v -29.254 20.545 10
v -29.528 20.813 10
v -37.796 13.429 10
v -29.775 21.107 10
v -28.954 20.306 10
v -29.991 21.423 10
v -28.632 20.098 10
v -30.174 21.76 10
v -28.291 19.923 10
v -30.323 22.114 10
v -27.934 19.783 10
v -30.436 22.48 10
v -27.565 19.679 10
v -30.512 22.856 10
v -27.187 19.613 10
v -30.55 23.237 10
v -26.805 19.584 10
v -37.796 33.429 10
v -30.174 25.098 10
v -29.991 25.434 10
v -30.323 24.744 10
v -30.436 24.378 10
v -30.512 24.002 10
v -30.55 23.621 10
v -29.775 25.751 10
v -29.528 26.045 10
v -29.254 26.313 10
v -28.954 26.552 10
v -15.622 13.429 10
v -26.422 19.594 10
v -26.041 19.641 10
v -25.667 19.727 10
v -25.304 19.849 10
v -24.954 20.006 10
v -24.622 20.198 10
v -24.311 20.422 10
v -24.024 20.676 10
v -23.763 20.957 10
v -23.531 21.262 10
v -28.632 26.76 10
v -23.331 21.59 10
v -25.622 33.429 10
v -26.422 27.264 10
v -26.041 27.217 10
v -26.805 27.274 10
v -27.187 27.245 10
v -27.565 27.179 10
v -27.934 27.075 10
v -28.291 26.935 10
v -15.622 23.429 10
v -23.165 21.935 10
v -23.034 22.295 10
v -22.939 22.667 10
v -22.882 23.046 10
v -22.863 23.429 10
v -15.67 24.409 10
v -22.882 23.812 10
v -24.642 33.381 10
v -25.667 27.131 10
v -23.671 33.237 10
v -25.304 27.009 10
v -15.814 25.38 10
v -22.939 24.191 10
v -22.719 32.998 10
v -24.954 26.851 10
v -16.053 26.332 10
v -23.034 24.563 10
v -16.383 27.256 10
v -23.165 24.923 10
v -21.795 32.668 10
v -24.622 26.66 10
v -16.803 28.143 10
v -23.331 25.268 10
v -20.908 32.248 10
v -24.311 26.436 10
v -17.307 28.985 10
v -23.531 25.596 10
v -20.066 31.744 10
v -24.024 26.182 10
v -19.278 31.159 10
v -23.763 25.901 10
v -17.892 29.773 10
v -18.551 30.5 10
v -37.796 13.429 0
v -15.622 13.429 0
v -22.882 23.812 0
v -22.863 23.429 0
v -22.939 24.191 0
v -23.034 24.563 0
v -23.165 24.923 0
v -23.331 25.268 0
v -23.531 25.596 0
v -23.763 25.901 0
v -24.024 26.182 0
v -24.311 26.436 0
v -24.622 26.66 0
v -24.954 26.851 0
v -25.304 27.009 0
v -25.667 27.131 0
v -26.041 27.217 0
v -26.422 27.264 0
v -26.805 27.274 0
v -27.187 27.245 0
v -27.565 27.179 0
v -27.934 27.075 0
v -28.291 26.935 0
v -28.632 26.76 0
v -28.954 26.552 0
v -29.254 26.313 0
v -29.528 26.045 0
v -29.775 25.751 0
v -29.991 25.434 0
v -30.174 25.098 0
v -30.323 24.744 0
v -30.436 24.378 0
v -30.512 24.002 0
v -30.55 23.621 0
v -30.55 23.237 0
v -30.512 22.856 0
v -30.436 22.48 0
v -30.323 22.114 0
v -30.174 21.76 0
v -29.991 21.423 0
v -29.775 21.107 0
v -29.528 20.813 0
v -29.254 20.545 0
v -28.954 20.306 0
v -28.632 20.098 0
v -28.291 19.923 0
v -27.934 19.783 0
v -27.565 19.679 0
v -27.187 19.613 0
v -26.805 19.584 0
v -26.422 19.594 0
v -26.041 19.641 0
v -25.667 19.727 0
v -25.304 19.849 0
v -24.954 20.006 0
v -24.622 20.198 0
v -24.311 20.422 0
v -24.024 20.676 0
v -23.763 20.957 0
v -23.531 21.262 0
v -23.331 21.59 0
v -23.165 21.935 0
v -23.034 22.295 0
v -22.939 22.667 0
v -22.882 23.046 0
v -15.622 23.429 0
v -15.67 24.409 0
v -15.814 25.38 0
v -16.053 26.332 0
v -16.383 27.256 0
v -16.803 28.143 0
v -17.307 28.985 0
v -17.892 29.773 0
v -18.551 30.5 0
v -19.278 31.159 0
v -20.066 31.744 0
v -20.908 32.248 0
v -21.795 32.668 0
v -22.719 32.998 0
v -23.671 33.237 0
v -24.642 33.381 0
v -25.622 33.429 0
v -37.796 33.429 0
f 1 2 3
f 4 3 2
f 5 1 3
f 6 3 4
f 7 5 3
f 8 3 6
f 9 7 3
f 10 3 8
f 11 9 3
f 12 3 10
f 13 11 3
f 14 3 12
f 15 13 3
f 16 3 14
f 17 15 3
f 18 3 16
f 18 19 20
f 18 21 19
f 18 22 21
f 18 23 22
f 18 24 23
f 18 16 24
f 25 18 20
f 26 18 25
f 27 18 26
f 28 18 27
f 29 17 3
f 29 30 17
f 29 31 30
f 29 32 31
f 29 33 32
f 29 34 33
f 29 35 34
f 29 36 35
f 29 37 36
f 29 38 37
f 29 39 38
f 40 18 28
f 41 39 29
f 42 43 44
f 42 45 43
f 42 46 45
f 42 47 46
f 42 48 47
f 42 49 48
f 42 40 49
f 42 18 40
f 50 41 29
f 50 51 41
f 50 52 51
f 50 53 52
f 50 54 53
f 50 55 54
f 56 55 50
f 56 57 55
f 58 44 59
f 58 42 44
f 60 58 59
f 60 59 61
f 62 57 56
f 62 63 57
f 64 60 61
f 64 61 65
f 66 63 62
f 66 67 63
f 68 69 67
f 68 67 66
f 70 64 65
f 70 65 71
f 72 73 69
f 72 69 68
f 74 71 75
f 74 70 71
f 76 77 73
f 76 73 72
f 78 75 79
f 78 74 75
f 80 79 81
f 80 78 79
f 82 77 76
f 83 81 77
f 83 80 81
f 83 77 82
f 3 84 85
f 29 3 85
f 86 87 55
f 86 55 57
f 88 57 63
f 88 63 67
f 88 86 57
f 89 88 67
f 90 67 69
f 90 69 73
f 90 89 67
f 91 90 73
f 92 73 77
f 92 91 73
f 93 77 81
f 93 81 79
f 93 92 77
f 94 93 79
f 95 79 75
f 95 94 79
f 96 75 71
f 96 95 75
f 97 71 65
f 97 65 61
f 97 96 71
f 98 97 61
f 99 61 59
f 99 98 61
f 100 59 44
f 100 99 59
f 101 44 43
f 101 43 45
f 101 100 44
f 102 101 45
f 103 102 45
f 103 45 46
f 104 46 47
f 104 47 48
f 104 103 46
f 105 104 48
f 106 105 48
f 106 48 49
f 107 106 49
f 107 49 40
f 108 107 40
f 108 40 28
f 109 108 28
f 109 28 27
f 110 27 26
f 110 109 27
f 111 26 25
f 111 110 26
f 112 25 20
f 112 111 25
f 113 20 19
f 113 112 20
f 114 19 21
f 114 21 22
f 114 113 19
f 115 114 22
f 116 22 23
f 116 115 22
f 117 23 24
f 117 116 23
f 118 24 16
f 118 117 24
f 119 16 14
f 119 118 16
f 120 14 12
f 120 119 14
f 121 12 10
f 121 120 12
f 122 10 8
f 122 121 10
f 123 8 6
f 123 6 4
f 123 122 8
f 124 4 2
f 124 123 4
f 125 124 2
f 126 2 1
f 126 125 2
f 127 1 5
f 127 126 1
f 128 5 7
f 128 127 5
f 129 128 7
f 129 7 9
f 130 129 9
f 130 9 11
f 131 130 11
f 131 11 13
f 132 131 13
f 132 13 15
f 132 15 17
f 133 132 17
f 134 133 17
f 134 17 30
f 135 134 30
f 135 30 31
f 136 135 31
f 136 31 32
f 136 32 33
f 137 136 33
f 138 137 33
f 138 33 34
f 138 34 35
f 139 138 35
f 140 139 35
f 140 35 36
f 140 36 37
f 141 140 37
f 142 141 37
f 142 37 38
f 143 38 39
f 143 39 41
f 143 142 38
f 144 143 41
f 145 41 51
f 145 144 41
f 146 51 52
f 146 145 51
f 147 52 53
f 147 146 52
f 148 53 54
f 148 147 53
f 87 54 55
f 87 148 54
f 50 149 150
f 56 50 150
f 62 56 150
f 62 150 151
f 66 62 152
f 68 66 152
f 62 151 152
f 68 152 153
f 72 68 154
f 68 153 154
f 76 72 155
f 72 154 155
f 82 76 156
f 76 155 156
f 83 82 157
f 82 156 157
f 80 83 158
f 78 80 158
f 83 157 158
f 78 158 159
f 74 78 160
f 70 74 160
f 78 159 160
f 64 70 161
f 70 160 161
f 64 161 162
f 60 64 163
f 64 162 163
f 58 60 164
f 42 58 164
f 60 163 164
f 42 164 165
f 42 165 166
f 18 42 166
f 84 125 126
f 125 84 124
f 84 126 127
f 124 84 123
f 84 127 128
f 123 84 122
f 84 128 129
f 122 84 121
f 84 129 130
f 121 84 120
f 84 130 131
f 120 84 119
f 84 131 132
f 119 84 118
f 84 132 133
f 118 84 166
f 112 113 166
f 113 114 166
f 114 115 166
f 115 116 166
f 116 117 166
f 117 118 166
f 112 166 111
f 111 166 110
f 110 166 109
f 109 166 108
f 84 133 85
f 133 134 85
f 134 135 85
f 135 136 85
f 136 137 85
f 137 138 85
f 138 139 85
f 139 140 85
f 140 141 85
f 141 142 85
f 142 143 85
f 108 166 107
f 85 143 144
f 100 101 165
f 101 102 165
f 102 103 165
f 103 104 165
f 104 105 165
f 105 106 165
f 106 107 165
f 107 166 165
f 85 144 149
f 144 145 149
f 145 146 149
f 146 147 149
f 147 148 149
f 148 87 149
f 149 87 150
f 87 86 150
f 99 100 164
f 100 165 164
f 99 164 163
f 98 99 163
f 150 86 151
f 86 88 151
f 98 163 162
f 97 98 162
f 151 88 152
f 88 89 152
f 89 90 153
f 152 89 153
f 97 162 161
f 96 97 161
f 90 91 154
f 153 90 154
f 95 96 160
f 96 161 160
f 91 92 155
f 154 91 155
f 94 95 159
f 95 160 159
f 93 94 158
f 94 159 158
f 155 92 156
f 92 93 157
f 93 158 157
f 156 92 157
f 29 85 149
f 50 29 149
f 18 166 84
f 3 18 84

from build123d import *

# Parameters (mm, degrees)
F0_R     = 3.846045
F1_DEPTH = 10


with BuildPart() as f1:
    # F0 (on Top) → F1 (new body)
    with BuildSketch(Plane.XY):
        with BuildLine():
            Line((-37.795966, 13.42895), (-15.622052, 13.42895))
            Line((-15.622052, 13.42895), (-15.622052, 23.42895))
            ThreePointArc((-15.622052, 23.42895), (-18.550985, 30.500018), (-25.622052, 33.42895))
            Line((-25.622052, 33.42895), (-37.795966, 33.42895))
            Line((-37.795966, 33.42895), (-37.795966, 13.42895))
        make_face()
        with Locations((-26.709009, 23.42895)):
            Circle(F0_R, mode=Mode.SUBTRACT)
    extrude(amount=F1_DEPTH)


solid = f1.part
